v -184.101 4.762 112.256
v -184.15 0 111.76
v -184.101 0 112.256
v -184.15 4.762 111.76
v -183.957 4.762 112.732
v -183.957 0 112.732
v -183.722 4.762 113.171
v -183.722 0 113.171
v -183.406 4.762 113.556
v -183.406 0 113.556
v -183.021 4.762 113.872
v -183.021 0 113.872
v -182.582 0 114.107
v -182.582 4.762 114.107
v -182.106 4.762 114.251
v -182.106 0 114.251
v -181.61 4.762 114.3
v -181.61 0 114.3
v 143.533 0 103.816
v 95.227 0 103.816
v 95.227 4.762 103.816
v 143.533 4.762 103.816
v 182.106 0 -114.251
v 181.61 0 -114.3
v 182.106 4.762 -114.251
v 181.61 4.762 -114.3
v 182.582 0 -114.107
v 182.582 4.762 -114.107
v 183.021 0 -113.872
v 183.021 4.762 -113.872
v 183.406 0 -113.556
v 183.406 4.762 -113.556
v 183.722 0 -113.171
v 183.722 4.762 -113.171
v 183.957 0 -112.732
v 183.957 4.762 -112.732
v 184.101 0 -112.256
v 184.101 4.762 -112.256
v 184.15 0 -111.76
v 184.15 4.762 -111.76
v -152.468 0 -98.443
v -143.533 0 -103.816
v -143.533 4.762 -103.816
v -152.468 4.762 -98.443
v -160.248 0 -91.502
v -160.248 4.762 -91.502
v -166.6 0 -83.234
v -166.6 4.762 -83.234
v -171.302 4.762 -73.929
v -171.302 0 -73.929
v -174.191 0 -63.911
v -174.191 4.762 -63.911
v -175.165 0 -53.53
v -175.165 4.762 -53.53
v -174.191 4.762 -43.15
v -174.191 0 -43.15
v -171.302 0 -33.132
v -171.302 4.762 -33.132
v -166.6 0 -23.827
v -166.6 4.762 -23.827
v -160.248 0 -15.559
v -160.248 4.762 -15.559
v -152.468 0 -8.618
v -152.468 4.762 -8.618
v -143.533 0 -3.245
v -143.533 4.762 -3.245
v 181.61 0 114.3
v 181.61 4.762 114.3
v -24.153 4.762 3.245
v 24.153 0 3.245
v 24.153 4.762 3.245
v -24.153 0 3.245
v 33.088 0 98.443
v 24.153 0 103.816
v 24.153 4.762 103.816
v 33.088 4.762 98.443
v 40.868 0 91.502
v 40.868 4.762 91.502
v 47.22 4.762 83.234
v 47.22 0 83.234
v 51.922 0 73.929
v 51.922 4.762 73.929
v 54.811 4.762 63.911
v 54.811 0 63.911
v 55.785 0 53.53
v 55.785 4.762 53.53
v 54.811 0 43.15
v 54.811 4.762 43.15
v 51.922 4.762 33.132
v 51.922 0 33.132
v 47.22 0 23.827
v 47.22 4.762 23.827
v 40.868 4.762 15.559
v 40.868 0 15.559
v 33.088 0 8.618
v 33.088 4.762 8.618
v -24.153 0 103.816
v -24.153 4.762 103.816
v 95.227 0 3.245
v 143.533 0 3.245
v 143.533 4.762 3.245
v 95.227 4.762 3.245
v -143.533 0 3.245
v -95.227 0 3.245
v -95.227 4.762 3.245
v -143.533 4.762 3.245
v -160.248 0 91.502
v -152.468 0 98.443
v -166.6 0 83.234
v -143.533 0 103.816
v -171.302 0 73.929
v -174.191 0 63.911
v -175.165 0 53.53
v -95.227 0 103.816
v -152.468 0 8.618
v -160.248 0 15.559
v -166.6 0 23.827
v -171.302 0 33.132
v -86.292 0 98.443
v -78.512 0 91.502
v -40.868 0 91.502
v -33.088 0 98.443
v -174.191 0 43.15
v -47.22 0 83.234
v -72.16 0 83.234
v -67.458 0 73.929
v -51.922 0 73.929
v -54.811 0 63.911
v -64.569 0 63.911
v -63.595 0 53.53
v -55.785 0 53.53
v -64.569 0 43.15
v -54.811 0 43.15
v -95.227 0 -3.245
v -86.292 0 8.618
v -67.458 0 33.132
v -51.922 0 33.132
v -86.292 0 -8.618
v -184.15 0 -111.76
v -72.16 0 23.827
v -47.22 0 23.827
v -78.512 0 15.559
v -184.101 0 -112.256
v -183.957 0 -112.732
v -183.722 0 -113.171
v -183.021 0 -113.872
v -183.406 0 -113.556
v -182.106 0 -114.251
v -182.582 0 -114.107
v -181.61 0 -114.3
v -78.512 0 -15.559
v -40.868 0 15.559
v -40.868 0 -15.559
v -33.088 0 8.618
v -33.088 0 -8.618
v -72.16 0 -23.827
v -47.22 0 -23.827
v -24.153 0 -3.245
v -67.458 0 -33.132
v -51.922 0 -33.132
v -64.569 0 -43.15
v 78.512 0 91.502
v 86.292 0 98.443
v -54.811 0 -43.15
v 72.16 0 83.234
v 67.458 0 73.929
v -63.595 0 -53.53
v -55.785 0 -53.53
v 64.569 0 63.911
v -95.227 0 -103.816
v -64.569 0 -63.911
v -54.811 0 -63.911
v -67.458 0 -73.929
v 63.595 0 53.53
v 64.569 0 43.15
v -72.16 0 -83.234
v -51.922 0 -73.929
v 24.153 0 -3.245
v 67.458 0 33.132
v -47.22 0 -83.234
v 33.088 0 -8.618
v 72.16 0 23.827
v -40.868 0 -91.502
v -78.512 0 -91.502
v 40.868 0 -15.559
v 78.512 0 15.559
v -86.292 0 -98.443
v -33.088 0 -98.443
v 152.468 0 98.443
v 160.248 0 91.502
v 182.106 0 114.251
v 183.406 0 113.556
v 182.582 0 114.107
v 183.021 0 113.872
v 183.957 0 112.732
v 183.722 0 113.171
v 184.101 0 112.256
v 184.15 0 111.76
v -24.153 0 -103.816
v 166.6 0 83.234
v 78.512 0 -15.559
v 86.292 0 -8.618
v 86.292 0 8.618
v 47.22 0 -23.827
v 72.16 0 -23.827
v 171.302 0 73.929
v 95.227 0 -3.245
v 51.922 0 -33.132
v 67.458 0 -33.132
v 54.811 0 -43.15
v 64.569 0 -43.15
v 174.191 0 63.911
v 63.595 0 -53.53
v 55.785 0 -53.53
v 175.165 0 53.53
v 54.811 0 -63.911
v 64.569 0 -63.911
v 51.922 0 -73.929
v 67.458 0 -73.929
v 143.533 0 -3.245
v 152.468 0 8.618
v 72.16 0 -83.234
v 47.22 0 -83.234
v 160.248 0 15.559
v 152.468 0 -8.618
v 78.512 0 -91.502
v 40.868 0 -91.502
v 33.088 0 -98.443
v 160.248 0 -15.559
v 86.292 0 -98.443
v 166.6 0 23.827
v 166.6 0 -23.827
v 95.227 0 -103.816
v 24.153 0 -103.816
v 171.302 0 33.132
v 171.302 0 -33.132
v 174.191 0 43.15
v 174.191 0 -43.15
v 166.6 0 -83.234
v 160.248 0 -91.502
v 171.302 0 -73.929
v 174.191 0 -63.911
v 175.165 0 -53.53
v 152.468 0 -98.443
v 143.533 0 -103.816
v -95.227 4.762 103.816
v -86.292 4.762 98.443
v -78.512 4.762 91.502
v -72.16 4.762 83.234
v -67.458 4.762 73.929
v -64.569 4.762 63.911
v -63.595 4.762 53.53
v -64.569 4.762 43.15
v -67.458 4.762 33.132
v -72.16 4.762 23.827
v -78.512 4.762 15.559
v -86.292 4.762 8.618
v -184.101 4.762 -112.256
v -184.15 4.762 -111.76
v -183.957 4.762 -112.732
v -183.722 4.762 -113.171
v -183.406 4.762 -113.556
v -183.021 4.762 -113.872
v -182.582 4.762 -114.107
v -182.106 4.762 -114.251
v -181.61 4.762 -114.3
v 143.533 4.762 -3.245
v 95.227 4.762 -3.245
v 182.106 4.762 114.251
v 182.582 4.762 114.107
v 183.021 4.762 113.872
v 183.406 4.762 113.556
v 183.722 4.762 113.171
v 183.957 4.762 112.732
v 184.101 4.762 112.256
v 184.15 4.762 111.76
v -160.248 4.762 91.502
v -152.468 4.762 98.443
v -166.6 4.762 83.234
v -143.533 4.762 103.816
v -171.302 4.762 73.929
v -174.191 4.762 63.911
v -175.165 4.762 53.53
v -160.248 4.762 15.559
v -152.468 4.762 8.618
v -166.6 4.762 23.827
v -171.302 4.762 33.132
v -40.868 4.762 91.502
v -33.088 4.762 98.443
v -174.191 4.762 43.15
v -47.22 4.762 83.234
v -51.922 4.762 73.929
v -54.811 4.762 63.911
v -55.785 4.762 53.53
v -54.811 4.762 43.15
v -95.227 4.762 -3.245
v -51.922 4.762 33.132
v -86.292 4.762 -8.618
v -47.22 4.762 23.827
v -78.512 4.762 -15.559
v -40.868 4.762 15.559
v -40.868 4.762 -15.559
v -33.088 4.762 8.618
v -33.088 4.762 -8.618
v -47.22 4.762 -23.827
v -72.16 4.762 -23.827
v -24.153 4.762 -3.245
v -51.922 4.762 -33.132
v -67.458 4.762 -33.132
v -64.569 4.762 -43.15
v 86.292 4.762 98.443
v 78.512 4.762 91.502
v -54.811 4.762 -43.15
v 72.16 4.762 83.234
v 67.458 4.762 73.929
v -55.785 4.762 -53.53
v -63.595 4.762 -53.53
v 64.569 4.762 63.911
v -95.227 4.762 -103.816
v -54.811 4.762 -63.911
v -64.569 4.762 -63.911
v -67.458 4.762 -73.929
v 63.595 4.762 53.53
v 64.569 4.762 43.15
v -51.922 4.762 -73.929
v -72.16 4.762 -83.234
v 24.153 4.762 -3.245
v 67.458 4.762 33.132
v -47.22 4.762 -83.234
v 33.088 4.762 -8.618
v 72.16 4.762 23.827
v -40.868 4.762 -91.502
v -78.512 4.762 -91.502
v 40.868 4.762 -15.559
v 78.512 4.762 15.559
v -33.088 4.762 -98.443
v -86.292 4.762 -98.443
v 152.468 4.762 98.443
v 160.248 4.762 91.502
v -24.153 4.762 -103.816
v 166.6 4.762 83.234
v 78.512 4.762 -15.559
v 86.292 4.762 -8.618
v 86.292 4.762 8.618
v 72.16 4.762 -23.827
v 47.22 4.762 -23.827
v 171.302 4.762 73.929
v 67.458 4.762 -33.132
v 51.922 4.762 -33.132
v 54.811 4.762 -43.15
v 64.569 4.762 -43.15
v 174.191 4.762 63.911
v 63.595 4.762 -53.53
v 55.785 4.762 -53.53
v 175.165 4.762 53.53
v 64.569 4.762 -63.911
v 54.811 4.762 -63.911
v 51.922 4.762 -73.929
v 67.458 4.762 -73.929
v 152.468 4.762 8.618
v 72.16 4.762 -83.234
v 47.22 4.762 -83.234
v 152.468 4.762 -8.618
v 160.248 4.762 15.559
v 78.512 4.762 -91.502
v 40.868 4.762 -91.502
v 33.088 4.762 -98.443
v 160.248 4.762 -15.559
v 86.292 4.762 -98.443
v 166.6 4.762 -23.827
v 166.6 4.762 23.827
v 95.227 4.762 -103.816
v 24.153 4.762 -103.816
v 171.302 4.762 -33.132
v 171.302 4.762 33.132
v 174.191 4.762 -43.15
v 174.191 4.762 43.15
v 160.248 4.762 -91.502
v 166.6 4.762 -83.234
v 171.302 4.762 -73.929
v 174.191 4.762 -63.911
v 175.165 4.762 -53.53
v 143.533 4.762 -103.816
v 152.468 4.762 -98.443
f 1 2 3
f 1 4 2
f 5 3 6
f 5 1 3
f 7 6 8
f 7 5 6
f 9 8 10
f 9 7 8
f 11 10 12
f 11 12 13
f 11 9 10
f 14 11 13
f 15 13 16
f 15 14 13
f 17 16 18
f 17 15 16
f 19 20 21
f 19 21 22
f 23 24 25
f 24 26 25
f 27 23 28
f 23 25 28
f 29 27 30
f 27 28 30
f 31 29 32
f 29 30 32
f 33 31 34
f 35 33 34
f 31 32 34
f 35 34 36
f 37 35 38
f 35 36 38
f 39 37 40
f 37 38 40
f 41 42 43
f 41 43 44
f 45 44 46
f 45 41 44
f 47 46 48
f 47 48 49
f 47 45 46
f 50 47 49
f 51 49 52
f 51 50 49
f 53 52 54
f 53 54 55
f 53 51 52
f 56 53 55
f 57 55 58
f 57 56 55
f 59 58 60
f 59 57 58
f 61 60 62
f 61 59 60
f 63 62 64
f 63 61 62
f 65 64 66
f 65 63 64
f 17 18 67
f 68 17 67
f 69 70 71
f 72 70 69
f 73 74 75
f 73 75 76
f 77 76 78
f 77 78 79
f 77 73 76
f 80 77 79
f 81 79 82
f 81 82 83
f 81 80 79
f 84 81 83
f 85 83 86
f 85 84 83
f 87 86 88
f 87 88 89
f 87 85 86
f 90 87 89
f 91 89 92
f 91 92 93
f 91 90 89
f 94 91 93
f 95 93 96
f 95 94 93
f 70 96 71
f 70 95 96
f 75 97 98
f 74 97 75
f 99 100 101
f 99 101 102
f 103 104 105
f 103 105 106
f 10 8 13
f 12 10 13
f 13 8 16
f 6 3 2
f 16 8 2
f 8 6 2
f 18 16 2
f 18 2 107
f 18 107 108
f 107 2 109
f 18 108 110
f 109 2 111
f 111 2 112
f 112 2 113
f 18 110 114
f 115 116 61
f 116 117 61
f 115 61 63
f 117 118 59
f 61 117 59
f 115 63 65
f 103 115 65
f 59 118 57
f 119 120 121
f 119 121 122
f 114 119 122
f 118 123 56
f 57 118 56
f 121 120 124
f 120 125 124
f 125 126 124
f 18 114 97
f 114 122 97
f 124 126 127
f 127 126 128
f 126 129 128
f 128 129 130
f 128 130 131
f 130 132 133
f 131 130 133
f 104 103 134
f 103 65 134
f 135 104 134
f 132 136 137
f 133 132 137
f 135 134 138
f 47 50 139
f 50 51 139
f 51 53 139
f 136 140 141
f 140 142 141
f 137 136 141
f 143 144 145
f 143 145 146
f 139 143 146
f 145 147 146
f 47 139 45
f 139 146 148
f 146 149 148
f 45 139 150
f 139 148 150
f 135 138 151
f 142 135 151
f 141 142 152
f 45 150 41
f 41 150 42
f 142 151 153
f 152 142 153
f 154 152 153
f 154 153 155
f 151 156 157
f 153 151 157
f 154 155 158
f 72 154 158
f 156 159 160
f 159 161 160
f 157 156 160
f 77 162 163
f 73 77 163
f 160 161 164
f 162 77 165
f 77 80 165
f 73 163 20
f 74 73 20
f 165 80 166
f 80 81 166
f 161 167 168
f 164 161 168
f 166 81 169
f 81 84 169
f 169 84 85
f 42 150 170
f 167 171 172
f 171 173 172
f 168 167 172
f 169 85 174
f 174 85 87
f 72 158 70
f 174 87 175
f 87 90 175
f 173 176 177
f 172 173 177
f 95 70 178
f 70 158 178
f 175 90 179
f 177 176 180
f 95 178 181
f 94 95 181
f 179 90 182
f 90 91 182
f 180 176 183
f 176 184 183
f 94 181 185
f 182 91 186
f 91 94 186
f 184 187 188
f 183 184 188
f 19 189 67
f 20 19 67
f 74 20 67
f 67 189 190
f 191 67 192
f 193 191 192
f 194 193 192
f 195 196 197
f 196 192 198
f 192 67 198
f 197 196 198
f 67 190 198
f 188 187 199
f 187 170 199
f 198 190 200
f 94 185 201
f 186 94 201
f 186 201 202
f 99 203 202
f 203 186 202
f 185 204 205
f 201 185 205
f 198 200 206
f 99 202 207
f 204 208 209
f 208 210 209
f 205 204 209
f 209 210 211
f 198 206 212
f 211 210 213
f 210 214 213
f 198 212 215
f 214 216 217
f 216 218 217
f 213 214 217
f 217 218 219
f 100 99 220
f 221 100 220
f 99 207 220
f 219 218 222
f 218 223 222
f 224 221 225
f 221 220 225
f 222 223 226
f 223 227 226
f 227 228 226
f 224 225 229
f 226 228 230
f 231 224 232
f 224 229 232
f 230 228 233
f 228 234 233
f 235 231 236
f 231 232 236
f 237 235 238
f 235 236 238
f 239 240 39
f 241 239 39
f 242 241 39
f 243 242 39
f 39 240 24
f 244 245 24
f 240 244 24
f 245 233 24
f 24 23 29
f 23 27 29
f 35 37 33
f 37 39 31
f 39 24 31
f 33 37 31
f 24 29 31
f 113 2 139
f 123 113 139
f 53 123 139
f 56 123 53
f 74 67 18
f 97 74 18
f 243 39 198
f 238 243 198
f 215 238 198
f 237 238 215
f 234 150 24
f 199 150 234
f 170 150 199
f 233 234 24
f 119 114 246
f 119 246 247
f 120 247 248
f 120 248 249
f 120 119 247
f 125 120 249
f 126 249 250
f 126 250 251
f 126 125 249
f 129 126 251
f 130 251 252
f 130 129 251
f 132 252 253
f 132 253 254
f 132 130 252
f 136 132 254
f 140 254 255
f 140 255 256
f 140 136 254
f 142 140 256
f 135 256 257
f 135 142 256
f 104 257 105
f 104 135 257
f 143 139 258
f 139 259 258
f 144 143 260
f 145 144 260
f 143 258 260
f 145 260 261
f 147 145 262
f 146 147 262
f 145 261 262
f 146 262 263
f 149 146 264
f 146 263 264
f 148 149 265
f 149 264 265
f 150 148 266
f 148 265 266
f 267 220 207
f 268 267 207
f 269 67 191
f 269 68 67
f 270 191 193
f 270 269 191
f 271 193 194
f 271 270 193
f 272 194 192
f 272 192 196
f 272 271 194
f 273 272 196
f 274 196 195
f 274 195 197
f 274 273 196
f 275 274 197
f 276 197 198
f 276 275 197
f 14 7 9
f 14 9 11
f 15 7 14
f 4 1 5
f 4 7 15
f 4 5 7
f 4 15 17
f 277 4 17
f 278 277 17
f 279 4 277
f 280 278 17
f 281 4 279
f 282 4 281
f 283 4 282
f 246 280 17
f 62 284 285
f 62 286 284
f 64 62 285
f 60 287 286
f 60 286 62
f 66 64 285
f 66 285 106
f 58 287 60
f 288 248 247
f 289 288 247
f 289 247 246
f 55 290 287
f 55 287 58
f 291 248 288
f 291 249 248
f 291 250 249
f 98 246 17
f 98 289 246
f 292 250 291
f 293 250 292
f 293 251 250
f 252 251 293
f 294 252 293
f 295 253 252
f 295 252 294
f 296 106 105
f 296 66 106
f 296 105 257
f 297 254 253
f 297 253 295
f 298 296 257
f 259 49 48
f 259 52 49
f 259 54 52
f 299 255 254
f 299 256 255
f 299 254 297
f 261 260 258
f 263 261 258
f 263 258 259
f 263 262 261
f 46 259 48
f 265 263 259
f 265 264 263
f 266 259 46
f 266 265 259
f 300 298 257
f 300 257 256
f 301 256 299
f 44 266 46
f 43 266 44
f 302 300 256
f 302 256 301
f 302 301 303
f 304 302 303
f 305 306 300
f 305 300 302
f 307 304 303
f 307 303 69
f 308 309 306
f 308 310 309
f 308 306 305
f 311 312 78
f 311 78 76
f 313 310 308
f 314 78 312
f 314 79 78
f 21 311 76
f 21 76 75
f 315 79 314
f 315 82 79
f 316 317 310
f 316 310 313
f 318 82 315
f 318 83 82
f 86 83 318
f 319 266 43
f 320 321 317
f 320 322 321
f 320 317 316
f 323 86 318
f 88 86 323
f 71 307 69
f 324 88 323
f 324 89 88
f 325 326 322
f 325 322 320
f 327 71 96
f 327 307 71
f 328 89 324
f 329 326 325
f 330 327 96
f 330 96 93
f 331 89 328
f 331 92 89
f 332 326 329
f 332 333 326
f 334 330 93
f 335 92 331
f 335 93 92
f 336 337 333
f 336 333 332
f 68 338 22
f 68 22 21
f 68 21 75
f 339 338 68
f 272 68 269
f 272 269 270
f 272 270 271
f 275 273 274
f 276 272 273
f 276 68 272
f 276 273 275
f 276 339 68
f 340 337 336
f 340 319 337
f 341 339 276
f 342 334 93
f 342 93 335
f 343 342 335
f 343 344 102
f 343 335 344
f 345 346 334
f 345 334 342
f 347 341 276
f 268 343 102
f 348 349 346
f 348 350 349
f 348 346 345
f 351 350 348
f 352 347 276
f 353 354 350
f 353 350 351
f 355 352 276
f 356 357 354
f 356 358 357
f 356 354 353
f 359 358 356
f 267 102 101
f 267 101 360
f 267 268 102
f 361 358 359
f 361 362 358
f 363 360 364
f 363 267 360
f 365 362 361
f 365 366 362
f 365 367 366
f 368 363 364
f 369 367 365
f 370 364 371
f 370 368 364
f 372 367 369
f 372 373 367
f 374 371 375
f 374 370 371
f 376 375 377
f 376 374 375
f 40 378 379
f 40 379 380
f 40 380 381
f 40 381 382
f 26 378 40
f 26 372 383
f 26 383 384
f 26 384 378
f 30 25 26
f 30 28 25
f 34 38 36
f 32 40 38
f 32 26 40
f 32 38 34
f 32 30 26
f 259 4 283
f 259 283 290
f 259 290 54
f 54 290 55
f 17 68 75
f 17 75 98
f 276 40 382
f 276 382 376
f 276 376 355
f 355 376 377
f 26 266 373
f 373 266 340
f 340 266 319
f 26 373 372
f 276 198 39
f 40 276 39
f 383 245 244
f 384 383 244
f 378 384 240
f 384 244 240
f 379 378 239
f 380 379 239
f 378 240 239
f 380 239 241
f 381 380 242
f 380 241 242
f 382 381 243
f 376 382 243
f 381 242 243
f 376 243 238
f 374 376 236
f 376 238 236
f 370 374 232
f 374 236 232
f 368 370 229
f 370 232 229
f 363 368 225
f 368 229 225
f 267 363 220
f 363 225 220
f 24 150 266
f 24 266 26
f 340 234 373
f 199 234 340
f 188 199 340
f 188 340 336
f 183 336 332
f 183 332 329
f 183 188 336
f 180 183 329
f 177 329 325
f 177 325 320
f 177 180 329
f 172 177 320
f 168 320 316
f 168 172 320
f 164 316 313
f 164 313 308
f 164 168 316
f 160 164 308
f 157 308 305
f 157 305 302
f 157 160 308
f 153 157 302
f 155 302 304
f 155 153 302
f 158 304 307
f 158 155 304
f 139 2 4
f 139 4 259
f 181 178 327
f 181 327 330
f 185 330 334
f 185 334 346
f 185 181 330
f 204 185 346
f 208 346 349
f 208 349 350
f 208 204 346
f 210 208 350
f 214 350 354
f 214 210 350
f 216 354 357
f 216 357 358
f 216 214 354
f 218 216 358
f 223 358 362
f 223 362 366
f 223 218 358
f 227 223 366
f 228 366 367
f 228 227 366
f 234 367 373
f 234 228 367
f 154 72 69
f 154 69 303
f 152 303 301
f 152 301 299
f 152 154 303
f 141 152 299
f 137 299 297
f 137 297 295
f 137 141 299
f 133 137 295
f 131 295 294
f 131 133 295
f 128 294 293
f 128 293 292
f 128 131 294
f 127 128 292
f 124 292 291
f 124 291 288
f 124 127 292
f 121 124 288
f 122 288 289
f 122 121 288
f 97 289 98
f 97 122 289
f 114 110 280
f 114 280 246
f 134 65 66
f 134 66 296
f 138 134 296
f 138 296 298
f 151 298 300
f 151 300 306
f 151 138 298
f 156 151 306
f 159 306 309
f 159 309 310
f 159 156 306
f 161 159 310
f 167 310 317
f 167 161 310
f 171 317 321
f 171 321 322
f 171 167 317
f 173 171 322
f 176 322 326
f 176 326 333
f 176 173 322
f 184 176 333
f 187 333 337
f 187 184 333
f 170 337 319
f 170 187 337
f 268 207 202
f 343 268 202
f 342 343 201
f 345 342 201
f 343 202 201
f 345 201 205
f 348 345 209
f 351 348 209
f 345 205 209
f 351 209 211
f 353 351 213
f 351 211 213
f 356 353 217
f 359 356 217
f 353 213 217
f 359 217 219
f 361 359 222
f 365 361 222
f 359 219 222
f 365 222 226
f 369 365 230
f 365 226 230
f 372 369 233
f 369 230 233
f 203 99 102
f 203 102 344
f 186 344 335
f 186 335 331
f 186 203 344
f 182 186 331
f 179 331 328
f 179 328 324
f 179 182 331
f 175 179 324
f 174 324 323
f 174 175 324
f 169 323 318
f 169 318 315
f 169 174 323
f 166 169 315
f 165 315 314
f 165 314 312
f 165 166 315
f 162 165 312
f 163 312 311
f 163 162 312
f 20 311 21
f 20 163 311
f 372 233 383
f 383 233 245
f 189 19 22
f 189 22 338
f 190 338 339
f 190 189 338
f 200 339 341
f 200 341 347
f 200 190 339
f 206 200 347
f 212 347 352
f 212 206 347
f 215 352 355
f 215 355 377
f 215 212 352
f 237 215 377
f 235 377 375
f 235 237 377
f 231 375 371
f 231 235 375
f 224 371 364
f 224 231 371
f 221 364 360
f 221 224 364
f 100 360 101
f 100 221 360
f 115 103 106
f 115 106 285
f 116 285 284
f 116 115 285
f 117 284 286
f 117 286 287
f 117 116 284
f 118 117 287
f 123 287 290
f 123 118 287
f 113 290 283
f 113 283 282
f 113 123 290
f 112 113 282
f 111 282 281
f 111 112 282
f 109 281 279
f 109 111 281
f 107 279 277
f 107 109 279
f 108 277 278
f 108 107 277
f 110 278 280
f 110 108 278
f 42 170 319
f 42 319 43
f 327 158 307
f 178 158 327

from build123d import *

# Parameters (mm, degrees)
SKETCH1_W             = 368.3
SKETCH1_H             = 228.6
BOSS_EXTRUDE1_DEPTH   = 4.7625
CUT_EXTRUDE1_DEPTH    = 217.791129676
SKETCH_PATTERN1_DEPTH = 4.7625
FILLET1_R             = 2.54


# Read off the part's stored shape, not the designer's step: Sketch-Pattern1
with BuildPart() as part:
    # Sketch1 → Boss-Extrude1 (new body)
    with BuildSketch(Plane(origin=(0, 0, 0), x_dir=(1, 0, 0), z_dir=(0, 1, 0))):
        Rectangle(SKETCH1_W, SKETCH1_H)
    extrude(amount=BOSS_EXTRUDE1_DEPTH)

    # Sketch3 → Cut-Extrude1 (cut, through all)
    with BuildSketch(Plane.XZ):
        with BuildLine():
            Line((143.533374481, -3.245454654), (95.226625519, -3.245454654))
            ThreePointArc((95.226625519, -3.245454654), (63.594954654, -53.5305), (95.226625519, -103.815545346))
            Line((95.226625519, -103.815545346), (143.533374481, -103.815545346))
            ThreePointArc((143.533374481, -103.815545346), (175.165045346, -53.5305), (143.533374481, -3.245454654))
        make_face()
    extrude(amount=-CUT_EXTRUDE1_DEPTH, mode=Mode.SUBTRACT)

    # Sketch-Pattern1 outline → Sketch-Pattern1 (cut)
    with BuildSketch(Plane(origin=(0, 0, 0), x_dir=(1, 0, 0), z_dir=(0, 1, 0))):
        with BuildLine():
            ThreePointArc((-24.153374481, 103.815545346), (-55.785045346, 53.5305), (-24.153374481, 3.245454654))
            Line((-24.153374481, 3.245454654), (24.153374481, 3.245454654))
            ThreePointArc((24.153374481, 3.245454654), (55.785045346, 53.5305), (24.153374481, 103.815545346))
            Line((24.153374481, 103.815545346), (-24.153374481, 103.815545346))
        make_face()
        with BuildLine():
            ThreePointArc((-143.533374481, 103.815545346), (-175.165045346, 53.5305), (-143.533374481, 3.245454654))
            Line((-143.533374481, 3.245454654), (-95.226625519, 3.245454654))
            ThreePointArc((-95.226625519, 3.245454654), (-63.594954654, 53.5305), (-95.226625519, 103.815545346))
            Line((-95.226625519, 103.815545346), (-143.533374481, 103.815545346))
        make_face()
        with BuildLine():
            ThreePointArc((95.226625519, -3.245454654), (63.594954654, -53.5305), (95.226625519, -103.815545346))
            Line((95.226625519, -103.815545346), (143.533374481, -103.815545346))
            ThreePointArc((143.533374481, -103.815545346), (175.165045346, -53.5305), (143.533374481, -3.245454654))
            Line((143.533374481, -3.245454654), (95.226625519, -3.245454654))
        make_face()
        with BuildLine():
            ThreePointArc((-24.153374481, -3.245454654), (-55.785045346, -53.5305), (-24.153374481, -103.815545346))
            Line((-24.153374481, -103.815545346), (24.153374481, -103.815545346))
            ThreePointArc((24.153374481, -103.815545346), (55.785045346, -53.5305), (24.153374481, -3.245454654))
            Line((24.153374481, -3.245454654), (-24.153374481, -3.245454654))
        make_face()
        with BuildLine():
            ThreePointArc((-143.533374481, -3.245454654), (-175.165045346, -53.5305), (-143.533374481, -103.815545346))
            Line((-143.533374481, -103.815545346), (-95.226625519, -103.815545346))
            ThreePointArc((-95.226625519, -103.815545346), (-63.594954654, -53.5305), (-95.226625519, -3.245454654))
            Line((-95.226625519, -3.245454654), (-143.533374481, -3.245454654))
        make_face()
    extrude(amount=SKETCH_PATTERN1_DEPTH, mode=Mode.SUBTRACT)

    # Fillet1
    fillet1_edges = [part.edges().sort_by_distance(p)[0] for p in [
        (184.15, 2.38125, 114.3),
        (-184.15, 2.38125, 114.3),
        (-184.15, 2.38125, -114.3),
        (184.15, 2.38125, -114.3),
    ]]
    fillet(fillet1_edges, radius=FILLET1_R)


solid = part.part
